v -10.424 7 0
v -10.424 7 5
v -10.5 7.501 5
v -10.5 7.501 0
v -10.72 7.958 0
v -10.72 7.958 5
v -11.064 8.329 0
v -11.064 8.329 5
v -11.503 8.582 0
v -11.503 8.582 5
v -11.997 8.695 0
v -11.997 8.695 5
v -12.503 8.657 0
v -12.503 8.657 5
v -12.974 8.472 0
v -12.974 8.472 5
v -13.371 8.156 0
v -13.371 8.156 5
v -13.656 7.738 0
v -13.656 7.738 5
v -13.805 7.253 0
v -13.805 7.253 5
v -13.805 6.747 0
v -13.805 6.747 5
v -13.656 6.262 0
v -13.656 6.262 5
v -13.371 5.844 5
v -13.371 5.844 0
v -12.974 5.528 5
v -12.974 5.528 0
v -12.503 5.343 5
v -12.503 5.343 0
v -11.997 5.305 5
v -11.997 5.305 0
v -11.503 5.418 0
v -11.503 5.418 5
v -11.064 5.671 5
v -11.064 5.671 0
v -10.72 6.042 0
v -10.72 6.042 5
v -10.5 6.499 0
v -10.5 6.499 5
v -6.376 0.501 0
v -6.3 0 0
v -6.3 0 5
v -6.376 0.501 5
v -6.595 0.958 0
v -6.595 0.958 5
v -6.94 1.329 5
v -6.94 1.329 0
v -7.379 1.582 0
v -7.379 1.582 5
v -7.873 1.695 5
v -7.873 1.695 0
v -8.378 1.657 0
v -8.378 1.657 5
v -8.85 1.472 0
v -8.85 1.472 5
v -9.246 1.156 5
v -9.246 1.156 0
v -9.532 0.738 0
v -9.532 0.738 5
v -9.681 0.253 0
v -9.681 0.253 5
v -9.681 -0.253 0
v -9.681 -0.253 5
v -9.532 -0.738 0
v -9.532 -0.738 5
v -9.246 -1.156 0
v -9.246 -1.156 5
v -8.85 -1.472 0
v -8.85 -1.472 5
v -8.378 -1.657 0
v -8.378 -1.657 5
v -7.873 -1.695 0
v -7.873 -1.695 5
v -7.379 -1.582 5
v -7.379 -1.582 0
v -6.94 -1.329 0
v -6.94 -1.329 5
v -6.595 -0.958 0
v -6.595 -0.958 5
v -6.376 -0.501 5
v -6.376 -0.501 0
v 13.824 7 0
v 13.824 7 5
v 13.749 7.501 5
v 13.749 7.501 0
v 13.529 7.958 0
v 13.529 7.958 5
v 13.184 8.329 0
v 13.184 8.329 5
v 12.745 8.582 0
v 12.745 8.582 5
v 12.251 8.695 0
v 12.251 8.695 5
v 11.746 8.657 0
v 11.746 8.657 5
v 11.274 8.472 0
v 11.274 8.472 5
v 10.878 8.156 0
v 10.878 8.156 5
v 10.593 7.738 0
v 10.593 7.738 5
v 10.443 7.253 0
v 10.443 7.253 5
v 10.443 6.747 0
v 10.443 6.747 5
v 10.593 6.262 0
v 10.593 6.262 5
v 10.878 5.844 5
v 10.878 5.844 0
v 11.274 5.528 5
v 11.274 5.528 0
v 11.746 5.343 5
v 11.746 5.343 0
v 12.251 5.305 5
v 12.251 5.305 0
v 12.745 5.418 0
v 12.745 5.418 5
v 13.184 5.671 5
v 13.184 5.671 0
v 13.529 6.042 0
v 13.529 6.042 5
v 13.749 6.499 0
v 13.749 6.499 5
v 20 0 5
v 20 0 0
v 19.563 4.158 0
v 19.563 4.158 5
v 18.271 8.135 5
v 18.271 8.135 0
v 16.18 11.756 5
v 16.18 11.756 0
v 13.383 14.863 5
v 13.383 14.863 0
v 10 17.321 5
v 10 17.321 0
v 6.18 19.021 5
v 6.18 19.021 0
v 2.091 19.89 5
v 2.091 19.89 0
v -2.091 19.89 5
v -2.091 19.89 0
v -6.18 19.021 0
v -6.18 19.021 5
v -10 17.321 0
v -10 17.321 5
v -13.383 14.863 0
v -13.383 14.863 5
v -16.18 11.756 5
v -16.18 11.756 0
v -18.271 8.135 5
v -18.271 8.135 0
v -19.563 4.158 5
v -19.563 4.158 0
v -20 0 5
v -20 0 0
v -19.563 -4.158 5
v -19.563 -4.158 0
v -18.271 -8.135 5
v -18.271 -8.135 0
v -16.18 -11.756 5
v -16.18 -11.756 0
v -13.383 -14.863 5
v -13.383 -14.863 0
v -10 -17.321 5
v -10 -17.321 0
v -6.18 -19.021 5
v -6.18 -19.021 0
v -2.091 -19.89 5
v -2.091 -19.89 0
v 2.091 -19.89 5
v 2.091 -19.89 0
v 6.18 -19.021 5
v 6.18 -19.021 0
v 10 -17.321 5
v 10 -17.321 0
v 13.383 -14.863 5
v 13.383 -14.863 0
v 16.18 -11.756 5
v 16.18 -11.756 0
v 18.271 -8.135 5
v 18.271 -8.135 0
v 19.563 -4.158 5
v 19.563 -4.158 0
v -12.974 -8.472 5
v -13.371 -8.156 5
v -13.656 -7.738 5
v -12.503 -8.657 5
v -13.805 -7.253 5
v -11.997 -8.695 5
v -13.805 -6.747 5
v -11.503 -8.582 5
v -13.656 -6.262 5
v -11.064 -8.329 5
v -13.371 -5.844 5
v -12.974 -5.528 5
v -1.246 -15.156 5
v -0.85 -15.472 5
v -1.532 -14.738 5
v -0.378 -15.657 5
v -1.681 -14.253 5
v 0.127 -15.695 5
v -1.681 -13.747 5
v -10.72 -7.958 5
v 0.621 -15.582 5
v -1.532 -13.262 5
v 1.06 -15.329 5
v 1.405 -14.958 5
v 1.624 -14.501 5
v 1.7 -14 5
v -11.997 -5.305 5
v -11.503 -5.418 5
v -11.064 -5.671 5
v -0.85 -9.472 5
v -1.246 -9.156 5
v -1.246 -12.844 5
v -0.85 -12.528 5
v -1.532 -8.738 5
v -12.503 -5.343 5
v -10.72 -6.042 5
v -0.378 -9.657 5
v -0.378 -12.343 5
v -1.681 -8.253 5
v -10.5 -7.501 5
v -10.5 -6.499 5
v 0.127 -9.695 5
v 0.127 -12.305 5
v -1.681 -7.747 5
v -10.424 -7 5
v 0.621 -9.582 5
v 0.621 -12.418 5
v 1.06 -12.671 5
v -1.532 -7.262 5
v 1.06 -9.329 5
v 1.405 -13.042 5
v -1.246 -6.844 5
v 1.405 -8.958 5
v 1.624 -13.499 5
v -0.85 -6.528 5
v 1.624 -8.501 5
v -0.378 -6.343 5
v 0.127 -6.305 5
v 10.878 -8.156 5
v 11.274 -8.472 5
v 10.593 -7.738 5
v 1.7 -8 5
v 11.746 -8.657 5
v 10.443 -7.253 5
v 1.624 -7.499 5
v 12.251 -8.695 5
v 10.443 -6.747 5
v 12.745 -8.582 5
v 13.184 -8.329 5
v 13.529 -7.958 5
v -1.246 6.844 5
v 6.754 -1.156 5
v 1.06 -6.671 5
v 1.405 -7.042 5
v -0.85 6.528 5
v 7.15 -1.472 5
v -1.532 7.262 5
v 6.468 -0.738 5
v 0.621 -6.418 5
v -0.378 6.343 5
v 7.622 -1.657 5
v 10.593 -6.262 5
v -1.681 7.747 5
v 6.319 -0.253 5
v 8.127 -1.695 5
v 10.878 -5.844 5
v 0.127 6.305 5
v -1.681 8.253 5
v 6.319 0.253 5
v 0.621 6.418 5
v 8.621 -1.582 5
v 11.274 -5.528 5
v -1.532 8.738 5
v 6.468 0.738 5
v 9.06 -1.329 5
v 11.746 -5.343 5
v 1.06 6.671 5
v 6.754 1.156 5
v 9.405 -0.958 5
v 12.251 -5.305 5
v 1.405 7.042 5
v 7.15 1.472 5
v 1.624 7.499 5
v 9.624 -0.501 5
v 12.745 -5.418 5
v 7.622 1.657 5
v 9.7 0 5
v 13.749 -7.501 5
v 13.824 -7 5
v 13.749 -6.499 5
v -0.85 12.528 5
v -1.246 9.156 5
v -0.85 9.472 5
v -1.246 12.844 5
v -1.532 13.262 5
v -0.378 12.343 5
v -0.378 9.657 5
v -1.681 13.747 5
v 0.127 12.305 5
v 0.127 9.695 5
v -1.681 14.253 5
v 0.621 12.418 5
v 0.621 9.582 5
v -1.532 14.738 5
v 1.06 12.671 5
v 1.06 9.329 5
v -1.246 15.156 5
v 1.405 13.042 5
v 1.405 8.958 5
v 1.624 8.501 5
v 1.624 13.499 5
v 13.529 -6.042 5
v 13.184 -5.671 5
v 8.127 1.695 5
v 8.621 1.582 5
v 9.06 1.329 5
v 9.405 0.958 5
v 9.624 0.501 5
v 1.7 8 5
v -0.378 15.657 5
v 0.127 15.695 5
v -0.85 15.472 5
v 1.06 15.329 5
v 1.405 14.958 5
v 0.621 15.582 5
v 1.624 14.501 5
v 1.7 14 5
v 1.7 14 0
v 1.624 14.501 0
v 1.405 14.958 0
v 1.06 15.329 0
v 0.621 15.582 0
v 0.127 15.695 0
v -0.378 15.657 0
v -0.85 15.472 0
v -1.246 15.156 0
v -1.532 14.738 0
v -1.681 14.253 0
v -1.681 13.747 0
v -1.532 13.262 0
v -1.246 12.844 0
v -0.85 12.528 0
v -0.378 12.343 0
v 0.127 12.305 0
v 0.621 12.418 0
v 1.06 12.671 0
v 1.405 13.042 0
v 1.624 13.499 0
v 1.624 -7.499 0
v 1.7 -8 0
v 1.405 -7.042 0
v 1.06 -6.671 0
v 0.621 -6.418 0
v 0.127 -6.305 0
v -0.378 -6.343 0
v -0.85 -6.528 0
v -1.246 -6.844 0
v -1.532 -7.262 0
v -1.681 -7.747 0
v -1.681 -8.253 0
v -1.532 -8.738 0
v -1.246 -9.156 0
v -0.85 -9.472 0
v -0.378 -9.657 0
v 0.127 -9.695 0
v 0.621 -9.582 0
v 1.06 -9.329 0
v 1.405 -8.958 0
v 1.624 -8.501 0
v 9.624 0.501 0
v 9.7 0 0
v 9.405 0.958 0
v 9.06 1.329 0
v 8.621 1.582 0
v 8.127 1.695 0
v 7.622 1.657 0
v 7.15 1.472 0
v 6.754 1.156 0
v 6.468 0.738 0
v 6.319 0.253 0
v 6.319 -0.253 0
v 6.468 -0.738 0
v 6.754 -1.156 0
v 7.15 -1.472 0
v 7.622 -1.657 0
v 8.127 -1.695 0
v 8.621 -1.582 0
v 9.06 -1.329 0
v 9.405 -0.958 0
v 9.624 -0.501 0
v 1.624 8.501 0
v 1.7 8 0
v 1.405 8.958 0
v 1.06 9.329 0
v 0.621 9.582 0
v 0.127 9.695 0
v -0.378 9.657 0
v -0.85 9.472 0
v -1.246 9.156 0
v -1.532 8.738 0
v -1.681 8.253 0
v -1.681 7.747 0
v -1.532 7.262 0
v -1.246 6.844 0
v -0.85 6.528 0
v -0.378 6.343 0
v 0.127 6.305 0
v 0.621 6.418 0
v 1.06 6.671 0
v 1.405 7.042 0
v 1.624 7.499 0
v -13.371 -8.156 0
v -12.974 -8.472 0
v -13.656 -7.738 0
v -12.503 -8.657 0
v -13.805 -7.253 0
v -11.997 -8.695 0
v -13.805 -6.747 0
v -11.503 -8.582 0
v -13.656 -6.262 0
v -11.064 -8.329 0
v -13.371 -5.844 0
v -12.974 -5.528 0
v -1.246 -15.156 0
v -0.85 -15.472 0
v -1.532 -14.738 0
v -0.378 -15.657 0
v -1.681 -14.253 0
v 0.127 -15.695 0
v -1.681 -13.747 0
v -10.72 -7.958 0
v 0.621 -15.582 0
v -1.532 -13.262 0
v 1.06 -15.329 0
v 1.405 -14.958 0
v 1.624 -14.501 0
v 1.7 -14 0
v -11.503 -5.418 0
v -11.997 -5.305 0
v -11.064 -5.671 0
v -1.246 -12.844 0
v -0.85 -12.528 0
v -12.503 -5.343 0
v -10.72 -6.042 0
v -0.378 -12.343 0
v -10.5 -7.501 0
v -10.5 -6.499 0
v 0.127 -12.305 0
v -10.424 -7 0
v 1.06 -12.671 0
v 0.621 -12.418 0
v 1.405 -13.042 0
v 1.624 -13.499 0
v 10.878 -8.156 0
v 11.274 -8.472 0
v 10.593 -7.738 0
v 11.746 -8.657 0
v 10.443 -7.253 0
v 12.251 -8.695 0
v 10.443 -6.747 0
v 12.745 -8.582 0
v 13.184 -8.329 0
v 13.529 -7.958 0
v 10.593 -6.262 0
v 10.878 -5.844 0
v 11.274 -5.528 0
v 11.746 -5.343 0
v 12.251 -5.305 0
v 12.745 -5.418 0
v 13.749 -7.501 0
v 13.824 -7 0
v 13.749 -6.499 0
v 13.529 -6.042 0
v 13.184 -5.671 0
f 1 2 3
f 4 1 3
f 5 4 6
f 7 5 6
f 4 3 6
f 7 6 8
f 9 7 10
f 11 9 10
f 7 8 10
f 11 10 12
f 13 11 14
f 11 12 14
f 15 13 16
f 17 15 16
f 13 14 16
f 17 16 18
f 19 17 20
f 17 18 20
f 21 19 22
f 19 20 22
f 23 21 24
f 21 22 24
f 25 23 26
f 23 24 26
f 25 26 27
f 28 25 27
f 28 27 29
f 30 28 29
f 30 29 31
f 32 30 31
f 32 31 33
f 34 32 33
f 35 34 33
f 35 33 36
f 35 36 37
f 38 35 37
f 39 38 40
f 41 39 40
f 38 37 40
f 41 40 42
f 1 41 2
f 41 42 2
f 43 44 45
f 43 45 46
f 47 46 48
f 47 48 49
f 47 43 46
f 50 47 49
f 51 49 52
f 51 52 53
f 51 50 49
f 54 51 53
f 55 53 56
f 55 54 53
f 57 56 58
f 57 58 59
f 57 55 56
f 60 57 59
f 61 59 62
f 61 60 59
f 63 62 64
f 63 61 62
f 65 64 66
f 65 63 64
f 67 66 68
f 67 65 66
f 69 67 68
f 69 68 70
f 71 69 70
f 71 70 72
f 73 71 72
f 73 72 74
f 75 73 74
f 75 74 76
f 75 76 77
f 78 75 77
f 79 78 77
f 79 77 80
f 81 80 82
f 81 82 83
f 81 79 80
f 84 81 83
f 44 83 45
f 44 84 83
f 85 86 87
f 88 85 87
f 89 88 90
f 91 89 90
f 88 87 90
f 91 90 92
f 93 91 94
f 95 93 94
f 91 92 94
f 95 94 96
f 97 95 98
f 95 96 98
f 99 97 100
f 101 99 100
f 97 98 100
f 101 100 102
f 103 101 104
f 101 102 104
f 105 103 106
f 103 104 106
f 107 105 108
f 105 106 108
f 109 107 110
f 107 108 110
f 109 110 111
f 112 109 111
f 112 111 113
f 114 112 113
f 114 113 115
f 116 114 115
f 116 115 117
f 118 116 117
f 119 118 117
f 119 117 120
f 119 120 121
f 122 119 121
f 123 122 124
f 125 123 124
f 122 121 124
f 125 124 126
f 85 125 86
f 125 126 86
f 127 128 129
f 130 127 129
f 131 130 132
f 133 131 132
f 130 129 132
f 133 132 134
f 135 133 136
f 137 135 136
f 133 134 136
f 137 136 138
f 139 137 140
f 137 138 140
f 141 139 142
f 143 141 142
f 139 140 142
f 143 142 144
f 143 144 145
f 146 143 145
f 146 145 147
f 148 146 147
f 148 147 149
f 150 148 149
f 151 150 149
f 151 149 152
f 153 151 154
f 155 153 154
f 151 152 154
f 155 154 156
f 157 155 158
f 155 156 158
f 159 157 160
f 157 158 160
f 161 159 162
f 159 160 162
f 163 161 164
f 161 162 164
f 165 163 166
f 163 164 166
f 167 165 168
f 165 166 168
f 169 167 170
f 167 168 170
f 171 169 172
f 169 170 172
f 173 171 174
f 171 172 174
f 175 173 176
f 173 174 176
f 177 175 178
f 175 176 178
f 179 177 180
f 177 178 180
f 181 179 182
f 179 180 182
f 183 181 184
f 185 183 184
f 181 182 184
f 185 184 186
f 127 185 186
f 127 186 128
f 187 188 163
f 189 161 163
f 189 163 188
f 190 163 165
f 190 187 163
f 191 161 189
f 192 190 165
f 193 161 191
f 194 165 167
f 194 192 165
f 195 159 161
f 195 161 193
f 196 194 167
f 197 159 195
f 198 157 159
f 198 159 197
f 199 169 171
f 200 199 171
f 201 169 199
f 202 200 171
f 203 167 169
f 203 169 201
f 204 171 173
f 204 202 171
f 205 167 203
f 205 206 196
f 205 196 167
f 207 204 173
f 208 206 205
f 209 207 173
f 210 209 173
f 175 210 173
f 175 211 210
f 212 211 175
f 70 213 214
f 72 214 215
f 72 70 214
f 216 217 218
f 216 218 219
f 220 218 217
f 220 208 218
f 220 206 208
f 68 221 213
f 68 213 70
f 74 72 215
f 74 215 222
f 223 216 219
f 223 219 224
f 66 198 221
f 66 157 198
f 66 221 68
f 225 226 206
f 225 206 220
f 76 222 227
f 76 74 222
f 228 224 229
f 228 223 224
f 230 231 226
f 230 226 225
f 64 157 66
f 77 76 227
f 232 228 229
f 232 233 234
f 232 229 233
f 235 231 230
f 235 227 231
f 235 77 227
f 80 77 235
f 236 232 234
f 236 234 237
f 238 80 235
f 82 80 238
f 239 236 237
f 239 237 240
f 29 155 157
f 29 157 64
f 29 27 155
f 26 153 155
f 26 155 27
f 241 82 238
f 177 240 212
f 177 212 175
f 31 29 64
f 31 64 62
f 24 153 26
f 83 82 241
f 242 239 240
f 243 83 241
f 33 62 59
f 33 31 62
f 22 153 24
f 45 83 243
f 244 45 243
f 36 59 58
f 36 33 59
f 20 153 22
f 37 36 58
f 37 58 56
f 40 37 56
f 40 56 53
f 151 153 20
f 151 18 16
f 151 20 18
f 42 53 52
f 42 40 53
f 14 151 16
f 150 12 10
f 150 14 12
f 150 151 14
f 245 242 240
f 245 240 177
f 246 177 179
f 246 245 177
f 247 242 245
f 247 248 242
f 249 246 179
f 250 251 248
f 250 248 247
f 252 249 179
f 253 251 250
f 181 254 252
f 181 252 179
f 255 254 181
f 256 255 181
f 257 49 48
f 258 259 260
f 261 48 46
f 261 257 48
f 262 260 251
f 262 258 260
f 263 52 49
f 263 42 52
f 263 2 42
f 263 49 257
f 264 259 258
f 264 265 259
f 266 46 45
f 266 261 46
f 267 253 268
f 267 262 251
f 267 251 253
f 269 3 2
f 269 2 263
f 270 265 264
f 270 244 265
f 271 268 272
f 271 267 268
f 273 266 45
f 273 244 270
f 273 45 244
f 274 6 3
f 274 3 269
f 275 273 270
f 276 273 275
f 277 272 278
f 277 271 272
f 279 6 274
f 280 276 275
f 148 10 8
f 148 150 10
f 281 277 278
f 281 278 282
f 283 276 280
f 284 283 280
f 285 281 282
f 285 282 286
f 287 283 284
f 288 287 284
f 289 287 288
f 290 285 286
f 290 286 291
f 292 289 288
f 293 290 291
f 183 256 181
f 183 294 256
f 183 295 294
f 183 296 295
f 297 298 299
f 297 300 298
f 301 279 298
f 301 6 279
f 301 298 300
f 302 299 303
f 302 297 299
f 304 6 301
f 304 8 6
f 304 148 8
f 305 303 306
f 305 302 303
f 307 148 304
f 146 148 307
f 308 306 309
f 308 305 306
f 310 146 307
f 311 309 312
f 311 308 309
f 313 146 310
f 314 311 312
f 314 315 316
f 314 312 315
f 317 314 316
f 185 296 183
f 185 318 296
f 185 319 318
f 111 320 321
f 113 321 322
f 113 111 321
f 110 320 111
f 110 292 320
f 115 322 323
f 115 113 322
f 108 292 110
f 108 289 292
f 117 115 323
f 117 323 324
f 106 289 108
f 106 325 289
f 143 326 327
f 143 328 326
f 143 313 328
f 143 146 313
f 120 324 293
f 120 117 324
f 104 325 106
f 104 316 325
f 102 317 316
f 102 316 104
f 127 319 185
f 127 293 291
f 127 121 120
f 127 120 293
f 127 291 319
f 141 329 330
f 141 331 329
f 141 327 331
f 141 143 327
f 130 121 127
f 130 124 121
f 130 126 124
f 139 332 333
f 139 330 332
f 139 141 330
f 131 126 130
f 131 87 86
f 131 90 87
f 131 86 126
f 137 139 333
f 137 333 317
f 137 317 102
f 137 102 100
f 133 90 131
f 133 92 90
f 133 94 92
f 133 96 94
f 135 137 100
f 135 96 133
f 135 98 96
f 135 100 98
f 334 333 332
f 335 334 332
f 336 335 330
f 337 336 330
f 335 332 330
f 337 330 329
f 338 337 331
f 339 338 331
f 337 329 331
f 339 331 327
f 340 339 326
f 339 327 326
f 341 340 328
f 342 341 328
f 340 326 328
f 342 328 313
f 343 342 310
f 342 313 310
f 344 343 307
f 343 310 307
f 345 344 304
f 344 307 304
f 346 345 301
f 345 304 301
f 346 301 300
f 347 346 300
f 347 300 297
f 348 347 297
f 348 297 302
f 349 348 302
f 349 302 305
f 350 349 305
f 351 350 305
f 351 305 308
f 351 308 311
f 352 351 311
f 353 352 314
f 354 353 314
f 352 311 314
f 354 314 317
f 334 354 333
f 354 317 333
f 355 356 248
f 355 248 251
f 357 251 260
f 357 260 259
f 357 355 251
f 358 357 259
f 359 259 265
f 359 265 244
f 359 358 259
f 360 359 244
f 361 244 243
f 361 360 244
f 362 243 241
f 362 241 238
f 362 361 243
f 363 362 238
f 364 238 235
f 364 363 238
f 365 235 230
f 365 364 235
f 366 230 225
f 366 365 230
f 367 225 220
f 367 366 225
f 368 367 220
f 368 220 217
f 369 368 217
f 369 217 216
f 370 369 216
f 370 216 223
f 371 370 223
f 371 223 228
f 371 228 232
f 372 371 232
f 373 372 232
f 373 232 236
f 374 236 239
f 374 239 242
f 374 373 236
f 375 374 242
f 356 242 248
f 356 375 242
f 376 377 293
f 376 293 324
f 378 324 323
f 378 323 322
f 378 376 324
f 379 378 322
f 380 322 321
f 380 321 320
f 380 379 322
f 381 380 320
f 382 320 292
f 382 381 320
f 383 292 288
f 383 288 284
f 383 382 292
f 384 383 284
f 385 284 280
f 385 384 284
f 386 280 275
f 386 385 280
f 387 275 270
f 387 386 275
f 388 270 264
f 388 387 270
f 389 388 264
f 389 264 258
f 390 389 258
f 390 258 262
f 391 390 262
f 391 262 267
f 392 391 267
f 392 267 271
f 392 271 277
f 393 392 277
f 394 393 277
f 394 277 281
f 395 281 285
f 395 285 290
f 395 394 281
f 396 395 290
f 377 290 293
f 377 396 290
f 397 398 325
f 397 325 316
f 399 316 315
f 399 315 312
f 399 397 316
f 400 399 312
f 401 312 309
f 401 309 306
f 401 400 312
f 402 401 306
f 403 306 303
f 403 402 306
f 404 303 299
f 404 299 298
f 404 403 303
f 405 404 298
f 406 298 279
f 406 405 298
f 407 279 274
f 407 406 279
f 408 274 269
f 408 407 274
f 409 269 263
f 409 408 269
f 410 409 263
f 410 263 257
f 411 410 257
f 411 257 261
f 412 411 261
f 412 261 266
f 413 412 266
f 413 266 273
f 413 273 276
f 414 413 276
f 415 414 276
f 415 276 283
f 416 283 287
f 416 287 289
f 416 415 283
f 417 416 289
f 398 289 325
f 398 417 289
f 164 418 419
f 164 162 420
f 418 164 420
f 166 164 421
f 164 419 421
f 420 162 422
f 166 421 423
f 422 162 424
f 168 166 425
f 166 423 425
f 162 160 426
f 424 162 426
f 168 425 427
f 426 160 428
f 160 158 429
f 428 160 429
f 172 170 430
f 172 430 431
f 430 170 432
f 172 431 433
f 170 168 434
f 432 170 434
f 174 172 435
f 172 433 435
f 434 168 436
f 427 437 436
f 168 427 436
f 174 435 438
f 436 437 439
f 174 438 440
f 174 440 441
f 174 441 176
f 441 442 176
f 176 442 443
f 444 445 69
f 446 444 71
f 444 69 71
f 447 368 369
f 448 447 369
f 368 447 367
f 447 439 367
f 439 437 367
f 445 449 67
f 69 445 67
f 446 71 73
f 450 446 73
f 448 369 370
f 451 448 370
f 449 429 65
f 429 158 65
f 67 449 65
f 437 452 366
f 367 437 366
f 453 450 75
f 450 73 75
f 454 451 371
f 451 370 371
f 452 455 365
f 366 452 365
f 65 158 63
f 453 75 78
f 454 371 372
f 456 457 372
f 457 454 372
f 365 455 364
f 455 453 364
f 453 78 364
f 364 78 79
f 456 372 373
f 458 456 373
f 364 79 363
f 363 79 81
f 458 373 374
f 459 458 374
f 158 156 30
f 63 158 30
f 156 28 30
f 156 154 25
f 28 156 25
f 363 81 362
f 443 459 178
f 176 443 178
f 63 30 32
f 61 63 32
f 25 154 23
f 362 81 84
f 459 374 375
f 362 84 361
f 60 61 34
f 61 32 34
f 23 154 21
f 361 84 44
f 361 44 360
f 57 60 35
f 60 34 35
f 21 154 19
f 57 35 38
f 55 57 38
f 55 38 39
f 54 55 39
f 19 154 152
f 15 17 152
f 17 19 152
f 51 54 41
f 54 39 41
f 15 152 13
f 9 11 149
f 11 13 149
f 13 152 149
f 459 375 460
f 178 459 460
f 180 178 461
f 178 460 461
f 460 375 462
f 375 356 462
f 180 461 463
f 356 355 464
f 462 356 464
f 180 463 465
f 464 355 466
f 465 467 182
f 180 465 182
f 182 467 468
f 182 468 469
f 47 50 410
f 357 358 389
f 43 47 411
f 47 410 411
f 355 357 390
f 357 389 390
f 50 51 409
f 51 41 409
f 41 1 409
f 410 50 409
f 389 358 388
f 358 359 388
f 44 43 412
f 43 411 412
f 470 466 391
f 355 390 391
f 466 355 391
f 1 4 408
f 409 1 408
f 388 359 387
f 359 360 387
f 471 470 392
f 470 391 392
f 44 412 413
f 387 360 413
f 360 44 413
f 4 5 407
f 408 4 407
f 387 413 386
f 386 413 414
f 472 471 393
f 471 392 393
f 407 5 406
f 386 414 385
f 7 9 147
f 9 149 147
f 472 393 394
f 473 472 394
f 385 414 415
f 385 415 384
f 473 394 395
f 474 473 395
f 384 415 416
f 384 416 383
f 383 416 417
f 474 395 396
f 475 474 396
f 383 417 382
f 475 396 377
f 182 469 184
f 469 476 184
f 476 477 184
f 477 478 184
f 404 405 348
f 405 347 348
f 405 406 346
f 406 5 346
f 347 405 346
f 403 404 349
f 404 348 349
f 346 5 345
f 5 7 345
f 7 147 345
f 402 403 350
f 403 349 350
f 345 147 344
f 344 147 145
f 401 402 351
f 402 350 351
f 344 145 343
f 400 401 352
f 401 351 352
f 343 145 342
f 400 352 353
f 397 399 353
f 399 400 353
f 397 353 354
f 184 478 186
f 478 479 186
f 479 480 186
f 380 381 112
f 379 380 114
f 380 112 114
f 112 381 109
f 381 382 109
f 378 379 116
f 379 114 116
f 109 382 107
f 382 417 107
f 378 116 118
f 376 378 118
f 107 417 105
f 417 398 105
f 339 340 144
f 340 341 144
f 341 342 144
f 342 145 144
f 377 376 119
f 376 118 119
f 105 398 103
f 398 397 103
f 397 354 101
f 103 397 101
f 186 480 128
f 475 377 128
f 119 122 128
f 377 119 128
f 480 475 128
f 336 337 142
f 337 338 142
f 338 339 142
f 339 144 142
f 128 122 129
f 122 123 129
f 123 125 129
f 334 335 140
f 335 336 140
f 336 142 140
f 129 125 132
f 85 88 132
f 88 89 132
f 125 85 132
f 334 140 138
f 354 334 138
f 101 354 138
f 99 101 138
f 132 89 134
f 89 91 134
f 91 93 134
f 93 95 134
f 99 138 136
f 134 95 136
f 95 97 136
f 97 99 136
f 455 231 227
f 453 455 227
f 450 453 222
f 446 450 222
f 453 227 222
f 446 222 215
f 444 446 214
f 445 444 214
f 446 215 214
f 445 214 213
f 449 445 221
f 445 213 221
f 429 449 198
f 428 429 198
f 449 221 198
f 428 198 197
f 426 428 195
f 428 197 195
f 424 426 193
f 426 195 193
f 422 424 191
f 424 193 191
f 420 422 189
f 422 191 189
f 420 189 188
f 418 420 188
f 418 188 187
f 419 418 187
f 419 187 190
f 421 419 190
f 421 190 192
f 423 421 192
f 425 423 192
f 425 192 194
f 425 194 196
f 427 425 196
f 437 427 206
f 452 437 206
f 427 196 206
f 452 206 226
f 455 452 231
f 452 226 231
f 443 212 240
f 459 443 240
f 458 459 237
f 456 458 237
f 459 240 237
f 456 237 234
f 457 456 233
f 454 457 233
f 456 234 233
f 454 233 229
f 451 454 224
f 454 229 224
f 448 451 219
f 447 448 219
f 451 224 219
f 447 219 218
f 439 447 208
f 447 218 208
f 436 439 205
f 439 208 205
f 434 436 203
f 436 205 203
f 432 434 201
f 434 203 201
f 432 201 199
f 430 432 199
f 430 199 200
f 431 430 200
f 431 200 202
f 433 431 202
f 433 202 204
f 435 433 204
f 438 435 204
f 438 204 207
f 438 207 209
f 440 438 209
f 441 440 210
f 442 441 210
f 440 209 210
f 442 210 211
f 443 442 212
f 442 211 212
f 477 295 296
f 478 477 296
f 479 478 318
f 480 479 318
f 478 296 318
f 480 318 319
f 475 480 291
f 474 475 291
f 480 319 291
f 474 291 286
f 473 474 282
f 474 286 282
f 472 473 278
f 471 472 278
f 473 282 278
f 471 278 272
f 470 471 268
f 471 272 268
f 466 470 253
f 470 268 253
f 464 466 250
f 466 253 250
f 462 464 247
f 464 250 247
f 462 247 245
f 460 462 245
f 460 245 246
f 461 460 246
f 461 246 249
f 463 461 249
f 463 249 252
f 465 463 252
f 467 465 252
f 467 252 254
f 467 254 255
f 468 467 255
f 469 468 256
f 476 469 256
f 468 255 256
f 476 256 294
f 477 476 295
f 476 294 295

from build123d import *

# Parameters (mm, degrees)
SKETCH_1_R          = 20
SKETCH_1_R_2        = 1.7
EXTRUDE_1_DEPTH     = 5
SKETCH_2_R          = 1.7
CUT_EXTRUDE_1_DEPTH = 5


with BuildPart() as part:
    # 草图1 → 凸台-拉伸1 (new body)
    with BuildSketch(Plane.XY):
        Circle(SKETCH_1_R)
        with Locations((0, 8)):
            Circle(SKETCH_1_R_2, mode=Mode.SUBTRACT)
        with Locations((8, 0)):
            Circle(SKETCH_1_R_2, mode=Mode.SUBTRACT)
        with Locations((0, -8)):
            Circle(SKETCH_1_R_2, mode=Mode.SUBTRACT)
        with Locations((-8, 0)):
            Circle(SKETCH_1_R_2, mode=Mode.SUBTRACT)
    extrude(amount=EXTRUDE_1_DEPTH)

    # 草图2 → 切除-拉伸1 (cut)
    with BuildSketch(Plane.XY.offset(5)):
        with Locations((0, 14)):
            Circle(SKETCH_2_R)
        with Locations((12.124355653, 7)):
            Circle(SKETCH_2_R)
        with Locations((12.124355653, -7)):
            Circle(SKETCH_2_R)
        with Locations((0, -14)):
            Circle(SKETCH_2_R)
        with Locations((-12.124355653, -7)):
            Circle(SKETCH_2_R)
        with Locations((-12.124355653, 7)):
            Circle(SKETCH_2_R)
    extrude(amount=-CUT_EXTRUDE_1_DEPTH, mode=Mode.SUBTRACT)


solid = part.part
